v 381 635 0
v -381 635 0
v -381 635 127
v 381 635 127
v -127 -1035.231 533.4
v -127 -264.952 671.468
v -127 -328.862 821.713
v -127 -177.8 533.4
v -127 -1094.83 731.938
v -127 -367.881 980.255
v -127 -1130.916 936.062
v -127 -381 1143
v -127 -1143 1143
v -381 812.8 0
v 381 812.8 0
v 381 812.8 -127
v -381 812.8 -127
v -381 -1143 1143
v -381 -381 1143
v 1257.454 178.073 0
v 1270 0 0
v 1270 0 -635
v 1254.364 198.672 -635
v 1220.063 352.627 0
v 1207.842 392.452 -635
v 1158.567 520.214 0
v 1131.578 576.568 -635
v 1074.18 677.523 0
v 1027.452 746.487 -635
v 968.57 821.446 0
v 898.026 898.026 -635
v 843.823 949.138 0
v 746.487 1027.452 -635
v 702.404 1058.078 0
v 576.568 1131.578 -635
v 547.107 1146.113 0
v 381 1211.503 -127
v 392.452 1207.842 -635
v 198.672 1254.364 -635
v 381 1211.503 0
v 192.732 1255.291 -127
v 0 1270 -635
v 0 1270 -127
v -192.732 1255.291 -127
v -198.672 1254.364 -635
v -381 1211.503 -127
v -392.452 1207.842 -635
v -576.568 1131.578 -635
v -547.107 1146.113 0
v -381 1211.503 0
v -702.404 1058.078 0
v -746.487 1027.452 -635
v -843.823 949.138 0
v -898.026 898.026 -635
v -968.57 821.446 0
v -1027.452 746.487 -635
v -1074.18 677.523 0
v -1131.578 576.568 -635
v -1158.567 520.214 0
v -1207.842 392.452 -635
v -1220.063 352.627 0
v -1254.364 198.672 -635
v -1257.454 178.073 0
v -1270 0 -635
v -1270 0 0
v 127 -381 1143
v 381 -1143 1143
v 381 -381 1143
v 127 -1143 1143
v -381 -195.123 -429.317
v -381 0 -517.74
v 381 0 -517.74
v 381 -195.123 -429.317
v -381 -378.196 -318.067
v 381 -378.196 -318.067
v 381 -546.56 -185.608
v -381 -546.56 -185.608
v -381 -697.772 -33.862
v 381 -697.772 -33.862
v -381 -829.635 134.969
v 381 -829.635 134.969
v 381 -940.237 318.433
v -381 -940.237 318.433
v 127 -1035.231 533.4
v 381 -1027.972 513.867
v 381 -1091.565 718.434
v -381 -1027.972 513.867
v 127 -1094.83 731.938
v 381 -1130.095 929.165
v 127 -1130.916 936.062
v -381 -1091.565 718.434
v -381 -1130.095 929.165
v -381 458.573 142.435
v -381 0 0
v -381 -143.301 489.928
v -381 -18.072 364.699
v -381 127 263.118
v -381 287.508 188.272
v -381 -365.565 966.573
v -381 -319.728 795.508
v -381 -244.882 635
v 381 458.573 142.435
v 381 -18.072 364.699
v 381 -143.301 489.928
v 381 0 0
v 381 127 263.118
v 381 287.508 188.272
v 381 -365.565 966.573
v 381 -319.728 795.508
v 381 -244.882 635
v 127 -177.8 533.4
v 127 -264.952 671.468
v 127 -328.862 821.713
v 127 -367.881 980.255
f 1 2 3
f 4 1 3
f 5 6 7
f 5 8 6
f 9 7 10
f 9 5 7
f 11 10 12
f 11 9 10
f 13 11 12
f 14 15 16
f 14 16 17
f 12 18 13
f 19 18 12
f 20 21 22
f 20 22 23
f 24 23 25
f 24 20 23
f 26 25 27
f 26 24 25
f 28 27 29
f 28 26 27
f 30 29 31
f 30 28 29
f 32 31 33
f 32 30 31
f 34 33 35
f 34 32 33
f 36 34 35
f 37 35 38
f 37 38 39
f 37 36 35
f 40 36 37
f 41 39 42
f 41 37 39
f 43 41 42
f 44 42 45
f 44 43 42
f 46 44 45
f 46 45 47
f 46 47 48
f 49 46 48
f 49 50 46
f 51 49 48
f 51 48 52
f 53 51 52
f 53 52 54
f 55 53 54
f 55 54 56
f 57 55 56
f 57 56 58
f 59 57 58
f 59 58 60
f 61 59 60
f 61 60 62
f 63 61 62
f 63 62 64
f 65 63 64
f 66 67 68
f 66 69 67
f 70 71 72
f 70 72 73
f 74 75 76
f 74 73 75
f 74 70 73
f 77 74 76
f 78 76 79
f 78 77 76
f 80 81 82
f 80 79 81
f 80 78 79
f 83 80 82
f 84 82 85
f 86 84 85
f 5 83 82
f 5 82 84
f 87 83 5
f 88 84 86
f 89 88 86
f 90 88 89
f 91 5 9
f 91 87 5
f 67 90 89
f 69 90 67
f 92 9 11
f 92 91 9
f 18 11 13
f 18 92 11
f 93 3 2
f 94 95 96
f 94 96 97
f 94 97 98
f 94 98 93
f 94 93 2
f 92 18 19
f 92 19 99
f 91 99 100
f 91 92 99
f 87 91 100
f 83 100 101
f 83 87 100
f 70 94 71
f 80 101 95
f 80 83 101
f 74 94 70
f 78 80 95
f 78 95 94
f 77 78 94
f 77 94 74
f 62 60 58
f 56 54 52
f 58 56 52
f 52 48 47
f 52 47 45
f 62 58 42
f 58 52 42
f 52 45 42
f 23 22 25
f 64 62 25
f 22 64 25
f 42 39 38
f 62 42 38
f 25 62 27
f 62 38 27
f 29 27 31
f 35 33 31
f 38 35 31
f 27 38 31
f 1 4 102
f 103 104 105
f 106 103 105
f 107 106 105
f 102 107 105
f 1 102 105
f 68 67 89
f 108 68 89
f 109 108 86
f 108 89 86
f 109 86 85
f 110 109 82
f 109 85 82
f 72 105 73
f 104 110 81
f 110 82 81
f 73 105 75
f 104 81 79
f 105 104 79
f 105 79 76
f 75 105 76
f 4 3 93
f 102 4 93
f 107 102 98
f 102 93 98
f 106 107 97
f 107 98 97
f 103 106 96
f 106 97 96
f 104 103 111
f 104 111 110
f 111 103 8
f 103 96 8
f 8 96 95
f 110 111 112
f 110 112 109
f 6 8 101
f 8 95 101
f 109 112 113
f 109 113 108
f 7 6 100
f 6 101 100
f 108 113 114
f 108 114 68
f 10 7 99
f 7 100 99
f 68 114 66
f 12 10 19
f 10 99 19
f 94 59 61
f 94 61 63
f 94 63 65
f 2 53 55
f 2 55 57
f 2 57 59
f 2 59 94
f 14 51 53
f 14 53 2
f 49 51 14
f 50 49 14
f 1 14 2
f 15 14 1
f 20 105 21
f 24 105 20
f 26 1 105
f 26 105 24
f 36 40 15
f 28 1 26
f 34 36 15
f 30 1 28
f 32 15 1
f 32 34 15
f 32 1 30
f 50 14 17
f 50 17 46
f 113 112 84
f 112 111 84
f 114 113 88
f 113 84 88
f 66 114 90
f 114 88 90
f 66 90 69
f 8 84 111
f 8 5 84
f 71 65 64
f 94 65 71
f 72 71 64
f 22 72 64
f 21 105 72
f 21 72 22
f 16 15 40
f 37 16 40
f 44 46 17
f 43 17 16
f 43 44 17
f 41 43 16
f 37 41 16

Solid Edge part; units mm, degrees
sketch "Sketch1" plane through (0, 0, 0) normal (0, 0, 1) x (1, 0, 0)
  arc A0 (1270, 0) -> (-1270, 0) centre (0, 0) ccw
  line L0 (-1270, 0) -> (1270, 0)
extrude "Protrusion1" add sketch "Sketch1" against normal blind 635
sketch "Sketch2" plane through (0, 0, 0) normal (1, 0, 0) x (0, 1, 0)
  arc A0 (-381, 1143) -> (635, 127) centre (635, 1143) ccw
  line L0 (635, -635) -> (635, 127)
  arc A1 (-1143, 1143) -> (635, -635) centre (635, 1143) ccw
  line L1 (-1143, 1143) -> (-381, 1143)
extrude "ExtrudedProtrusion_2" add sketch "Sketch2" along normal mid plane 762
sketch "Sketch3" plane through (0, 0, 0) normal (1, 0, 0) x (0, 1, 0)
  line L0 (-1035.2311, 533.4) -> (-177.8, 533.4)
  arc A0 (-381, 1143) -> (-177.8, 533.4) centre (635, 1143) ccw
  line L1 (-1143, 1143) -> (-381, 1143)
  arc A1 (-1143, 1143) -> (-1035.2311, 533.4) centre (635, 1143) ccw
extrude "ExtrudedCutout_1" cut sketch "Sketch3" along normal mid plane 254
sketch "Sketch4" plane through (0, 635, 0) normal (0, 0, 1) x (0, 1, 0)
  line L0 (177.8, -381) -> (576.5028, -381)
  line L1 (177.8, 0) -> (177.8, -381)
  line L2 (177.8, 0) -> (177.8, 381)
  line L3 (177.8, 381) -> (576.5028, 381)
extrude "Cutout1" cut sketch "Sketch4" against normal blind 127 material side at (380.95, 1012.1514, 0)
